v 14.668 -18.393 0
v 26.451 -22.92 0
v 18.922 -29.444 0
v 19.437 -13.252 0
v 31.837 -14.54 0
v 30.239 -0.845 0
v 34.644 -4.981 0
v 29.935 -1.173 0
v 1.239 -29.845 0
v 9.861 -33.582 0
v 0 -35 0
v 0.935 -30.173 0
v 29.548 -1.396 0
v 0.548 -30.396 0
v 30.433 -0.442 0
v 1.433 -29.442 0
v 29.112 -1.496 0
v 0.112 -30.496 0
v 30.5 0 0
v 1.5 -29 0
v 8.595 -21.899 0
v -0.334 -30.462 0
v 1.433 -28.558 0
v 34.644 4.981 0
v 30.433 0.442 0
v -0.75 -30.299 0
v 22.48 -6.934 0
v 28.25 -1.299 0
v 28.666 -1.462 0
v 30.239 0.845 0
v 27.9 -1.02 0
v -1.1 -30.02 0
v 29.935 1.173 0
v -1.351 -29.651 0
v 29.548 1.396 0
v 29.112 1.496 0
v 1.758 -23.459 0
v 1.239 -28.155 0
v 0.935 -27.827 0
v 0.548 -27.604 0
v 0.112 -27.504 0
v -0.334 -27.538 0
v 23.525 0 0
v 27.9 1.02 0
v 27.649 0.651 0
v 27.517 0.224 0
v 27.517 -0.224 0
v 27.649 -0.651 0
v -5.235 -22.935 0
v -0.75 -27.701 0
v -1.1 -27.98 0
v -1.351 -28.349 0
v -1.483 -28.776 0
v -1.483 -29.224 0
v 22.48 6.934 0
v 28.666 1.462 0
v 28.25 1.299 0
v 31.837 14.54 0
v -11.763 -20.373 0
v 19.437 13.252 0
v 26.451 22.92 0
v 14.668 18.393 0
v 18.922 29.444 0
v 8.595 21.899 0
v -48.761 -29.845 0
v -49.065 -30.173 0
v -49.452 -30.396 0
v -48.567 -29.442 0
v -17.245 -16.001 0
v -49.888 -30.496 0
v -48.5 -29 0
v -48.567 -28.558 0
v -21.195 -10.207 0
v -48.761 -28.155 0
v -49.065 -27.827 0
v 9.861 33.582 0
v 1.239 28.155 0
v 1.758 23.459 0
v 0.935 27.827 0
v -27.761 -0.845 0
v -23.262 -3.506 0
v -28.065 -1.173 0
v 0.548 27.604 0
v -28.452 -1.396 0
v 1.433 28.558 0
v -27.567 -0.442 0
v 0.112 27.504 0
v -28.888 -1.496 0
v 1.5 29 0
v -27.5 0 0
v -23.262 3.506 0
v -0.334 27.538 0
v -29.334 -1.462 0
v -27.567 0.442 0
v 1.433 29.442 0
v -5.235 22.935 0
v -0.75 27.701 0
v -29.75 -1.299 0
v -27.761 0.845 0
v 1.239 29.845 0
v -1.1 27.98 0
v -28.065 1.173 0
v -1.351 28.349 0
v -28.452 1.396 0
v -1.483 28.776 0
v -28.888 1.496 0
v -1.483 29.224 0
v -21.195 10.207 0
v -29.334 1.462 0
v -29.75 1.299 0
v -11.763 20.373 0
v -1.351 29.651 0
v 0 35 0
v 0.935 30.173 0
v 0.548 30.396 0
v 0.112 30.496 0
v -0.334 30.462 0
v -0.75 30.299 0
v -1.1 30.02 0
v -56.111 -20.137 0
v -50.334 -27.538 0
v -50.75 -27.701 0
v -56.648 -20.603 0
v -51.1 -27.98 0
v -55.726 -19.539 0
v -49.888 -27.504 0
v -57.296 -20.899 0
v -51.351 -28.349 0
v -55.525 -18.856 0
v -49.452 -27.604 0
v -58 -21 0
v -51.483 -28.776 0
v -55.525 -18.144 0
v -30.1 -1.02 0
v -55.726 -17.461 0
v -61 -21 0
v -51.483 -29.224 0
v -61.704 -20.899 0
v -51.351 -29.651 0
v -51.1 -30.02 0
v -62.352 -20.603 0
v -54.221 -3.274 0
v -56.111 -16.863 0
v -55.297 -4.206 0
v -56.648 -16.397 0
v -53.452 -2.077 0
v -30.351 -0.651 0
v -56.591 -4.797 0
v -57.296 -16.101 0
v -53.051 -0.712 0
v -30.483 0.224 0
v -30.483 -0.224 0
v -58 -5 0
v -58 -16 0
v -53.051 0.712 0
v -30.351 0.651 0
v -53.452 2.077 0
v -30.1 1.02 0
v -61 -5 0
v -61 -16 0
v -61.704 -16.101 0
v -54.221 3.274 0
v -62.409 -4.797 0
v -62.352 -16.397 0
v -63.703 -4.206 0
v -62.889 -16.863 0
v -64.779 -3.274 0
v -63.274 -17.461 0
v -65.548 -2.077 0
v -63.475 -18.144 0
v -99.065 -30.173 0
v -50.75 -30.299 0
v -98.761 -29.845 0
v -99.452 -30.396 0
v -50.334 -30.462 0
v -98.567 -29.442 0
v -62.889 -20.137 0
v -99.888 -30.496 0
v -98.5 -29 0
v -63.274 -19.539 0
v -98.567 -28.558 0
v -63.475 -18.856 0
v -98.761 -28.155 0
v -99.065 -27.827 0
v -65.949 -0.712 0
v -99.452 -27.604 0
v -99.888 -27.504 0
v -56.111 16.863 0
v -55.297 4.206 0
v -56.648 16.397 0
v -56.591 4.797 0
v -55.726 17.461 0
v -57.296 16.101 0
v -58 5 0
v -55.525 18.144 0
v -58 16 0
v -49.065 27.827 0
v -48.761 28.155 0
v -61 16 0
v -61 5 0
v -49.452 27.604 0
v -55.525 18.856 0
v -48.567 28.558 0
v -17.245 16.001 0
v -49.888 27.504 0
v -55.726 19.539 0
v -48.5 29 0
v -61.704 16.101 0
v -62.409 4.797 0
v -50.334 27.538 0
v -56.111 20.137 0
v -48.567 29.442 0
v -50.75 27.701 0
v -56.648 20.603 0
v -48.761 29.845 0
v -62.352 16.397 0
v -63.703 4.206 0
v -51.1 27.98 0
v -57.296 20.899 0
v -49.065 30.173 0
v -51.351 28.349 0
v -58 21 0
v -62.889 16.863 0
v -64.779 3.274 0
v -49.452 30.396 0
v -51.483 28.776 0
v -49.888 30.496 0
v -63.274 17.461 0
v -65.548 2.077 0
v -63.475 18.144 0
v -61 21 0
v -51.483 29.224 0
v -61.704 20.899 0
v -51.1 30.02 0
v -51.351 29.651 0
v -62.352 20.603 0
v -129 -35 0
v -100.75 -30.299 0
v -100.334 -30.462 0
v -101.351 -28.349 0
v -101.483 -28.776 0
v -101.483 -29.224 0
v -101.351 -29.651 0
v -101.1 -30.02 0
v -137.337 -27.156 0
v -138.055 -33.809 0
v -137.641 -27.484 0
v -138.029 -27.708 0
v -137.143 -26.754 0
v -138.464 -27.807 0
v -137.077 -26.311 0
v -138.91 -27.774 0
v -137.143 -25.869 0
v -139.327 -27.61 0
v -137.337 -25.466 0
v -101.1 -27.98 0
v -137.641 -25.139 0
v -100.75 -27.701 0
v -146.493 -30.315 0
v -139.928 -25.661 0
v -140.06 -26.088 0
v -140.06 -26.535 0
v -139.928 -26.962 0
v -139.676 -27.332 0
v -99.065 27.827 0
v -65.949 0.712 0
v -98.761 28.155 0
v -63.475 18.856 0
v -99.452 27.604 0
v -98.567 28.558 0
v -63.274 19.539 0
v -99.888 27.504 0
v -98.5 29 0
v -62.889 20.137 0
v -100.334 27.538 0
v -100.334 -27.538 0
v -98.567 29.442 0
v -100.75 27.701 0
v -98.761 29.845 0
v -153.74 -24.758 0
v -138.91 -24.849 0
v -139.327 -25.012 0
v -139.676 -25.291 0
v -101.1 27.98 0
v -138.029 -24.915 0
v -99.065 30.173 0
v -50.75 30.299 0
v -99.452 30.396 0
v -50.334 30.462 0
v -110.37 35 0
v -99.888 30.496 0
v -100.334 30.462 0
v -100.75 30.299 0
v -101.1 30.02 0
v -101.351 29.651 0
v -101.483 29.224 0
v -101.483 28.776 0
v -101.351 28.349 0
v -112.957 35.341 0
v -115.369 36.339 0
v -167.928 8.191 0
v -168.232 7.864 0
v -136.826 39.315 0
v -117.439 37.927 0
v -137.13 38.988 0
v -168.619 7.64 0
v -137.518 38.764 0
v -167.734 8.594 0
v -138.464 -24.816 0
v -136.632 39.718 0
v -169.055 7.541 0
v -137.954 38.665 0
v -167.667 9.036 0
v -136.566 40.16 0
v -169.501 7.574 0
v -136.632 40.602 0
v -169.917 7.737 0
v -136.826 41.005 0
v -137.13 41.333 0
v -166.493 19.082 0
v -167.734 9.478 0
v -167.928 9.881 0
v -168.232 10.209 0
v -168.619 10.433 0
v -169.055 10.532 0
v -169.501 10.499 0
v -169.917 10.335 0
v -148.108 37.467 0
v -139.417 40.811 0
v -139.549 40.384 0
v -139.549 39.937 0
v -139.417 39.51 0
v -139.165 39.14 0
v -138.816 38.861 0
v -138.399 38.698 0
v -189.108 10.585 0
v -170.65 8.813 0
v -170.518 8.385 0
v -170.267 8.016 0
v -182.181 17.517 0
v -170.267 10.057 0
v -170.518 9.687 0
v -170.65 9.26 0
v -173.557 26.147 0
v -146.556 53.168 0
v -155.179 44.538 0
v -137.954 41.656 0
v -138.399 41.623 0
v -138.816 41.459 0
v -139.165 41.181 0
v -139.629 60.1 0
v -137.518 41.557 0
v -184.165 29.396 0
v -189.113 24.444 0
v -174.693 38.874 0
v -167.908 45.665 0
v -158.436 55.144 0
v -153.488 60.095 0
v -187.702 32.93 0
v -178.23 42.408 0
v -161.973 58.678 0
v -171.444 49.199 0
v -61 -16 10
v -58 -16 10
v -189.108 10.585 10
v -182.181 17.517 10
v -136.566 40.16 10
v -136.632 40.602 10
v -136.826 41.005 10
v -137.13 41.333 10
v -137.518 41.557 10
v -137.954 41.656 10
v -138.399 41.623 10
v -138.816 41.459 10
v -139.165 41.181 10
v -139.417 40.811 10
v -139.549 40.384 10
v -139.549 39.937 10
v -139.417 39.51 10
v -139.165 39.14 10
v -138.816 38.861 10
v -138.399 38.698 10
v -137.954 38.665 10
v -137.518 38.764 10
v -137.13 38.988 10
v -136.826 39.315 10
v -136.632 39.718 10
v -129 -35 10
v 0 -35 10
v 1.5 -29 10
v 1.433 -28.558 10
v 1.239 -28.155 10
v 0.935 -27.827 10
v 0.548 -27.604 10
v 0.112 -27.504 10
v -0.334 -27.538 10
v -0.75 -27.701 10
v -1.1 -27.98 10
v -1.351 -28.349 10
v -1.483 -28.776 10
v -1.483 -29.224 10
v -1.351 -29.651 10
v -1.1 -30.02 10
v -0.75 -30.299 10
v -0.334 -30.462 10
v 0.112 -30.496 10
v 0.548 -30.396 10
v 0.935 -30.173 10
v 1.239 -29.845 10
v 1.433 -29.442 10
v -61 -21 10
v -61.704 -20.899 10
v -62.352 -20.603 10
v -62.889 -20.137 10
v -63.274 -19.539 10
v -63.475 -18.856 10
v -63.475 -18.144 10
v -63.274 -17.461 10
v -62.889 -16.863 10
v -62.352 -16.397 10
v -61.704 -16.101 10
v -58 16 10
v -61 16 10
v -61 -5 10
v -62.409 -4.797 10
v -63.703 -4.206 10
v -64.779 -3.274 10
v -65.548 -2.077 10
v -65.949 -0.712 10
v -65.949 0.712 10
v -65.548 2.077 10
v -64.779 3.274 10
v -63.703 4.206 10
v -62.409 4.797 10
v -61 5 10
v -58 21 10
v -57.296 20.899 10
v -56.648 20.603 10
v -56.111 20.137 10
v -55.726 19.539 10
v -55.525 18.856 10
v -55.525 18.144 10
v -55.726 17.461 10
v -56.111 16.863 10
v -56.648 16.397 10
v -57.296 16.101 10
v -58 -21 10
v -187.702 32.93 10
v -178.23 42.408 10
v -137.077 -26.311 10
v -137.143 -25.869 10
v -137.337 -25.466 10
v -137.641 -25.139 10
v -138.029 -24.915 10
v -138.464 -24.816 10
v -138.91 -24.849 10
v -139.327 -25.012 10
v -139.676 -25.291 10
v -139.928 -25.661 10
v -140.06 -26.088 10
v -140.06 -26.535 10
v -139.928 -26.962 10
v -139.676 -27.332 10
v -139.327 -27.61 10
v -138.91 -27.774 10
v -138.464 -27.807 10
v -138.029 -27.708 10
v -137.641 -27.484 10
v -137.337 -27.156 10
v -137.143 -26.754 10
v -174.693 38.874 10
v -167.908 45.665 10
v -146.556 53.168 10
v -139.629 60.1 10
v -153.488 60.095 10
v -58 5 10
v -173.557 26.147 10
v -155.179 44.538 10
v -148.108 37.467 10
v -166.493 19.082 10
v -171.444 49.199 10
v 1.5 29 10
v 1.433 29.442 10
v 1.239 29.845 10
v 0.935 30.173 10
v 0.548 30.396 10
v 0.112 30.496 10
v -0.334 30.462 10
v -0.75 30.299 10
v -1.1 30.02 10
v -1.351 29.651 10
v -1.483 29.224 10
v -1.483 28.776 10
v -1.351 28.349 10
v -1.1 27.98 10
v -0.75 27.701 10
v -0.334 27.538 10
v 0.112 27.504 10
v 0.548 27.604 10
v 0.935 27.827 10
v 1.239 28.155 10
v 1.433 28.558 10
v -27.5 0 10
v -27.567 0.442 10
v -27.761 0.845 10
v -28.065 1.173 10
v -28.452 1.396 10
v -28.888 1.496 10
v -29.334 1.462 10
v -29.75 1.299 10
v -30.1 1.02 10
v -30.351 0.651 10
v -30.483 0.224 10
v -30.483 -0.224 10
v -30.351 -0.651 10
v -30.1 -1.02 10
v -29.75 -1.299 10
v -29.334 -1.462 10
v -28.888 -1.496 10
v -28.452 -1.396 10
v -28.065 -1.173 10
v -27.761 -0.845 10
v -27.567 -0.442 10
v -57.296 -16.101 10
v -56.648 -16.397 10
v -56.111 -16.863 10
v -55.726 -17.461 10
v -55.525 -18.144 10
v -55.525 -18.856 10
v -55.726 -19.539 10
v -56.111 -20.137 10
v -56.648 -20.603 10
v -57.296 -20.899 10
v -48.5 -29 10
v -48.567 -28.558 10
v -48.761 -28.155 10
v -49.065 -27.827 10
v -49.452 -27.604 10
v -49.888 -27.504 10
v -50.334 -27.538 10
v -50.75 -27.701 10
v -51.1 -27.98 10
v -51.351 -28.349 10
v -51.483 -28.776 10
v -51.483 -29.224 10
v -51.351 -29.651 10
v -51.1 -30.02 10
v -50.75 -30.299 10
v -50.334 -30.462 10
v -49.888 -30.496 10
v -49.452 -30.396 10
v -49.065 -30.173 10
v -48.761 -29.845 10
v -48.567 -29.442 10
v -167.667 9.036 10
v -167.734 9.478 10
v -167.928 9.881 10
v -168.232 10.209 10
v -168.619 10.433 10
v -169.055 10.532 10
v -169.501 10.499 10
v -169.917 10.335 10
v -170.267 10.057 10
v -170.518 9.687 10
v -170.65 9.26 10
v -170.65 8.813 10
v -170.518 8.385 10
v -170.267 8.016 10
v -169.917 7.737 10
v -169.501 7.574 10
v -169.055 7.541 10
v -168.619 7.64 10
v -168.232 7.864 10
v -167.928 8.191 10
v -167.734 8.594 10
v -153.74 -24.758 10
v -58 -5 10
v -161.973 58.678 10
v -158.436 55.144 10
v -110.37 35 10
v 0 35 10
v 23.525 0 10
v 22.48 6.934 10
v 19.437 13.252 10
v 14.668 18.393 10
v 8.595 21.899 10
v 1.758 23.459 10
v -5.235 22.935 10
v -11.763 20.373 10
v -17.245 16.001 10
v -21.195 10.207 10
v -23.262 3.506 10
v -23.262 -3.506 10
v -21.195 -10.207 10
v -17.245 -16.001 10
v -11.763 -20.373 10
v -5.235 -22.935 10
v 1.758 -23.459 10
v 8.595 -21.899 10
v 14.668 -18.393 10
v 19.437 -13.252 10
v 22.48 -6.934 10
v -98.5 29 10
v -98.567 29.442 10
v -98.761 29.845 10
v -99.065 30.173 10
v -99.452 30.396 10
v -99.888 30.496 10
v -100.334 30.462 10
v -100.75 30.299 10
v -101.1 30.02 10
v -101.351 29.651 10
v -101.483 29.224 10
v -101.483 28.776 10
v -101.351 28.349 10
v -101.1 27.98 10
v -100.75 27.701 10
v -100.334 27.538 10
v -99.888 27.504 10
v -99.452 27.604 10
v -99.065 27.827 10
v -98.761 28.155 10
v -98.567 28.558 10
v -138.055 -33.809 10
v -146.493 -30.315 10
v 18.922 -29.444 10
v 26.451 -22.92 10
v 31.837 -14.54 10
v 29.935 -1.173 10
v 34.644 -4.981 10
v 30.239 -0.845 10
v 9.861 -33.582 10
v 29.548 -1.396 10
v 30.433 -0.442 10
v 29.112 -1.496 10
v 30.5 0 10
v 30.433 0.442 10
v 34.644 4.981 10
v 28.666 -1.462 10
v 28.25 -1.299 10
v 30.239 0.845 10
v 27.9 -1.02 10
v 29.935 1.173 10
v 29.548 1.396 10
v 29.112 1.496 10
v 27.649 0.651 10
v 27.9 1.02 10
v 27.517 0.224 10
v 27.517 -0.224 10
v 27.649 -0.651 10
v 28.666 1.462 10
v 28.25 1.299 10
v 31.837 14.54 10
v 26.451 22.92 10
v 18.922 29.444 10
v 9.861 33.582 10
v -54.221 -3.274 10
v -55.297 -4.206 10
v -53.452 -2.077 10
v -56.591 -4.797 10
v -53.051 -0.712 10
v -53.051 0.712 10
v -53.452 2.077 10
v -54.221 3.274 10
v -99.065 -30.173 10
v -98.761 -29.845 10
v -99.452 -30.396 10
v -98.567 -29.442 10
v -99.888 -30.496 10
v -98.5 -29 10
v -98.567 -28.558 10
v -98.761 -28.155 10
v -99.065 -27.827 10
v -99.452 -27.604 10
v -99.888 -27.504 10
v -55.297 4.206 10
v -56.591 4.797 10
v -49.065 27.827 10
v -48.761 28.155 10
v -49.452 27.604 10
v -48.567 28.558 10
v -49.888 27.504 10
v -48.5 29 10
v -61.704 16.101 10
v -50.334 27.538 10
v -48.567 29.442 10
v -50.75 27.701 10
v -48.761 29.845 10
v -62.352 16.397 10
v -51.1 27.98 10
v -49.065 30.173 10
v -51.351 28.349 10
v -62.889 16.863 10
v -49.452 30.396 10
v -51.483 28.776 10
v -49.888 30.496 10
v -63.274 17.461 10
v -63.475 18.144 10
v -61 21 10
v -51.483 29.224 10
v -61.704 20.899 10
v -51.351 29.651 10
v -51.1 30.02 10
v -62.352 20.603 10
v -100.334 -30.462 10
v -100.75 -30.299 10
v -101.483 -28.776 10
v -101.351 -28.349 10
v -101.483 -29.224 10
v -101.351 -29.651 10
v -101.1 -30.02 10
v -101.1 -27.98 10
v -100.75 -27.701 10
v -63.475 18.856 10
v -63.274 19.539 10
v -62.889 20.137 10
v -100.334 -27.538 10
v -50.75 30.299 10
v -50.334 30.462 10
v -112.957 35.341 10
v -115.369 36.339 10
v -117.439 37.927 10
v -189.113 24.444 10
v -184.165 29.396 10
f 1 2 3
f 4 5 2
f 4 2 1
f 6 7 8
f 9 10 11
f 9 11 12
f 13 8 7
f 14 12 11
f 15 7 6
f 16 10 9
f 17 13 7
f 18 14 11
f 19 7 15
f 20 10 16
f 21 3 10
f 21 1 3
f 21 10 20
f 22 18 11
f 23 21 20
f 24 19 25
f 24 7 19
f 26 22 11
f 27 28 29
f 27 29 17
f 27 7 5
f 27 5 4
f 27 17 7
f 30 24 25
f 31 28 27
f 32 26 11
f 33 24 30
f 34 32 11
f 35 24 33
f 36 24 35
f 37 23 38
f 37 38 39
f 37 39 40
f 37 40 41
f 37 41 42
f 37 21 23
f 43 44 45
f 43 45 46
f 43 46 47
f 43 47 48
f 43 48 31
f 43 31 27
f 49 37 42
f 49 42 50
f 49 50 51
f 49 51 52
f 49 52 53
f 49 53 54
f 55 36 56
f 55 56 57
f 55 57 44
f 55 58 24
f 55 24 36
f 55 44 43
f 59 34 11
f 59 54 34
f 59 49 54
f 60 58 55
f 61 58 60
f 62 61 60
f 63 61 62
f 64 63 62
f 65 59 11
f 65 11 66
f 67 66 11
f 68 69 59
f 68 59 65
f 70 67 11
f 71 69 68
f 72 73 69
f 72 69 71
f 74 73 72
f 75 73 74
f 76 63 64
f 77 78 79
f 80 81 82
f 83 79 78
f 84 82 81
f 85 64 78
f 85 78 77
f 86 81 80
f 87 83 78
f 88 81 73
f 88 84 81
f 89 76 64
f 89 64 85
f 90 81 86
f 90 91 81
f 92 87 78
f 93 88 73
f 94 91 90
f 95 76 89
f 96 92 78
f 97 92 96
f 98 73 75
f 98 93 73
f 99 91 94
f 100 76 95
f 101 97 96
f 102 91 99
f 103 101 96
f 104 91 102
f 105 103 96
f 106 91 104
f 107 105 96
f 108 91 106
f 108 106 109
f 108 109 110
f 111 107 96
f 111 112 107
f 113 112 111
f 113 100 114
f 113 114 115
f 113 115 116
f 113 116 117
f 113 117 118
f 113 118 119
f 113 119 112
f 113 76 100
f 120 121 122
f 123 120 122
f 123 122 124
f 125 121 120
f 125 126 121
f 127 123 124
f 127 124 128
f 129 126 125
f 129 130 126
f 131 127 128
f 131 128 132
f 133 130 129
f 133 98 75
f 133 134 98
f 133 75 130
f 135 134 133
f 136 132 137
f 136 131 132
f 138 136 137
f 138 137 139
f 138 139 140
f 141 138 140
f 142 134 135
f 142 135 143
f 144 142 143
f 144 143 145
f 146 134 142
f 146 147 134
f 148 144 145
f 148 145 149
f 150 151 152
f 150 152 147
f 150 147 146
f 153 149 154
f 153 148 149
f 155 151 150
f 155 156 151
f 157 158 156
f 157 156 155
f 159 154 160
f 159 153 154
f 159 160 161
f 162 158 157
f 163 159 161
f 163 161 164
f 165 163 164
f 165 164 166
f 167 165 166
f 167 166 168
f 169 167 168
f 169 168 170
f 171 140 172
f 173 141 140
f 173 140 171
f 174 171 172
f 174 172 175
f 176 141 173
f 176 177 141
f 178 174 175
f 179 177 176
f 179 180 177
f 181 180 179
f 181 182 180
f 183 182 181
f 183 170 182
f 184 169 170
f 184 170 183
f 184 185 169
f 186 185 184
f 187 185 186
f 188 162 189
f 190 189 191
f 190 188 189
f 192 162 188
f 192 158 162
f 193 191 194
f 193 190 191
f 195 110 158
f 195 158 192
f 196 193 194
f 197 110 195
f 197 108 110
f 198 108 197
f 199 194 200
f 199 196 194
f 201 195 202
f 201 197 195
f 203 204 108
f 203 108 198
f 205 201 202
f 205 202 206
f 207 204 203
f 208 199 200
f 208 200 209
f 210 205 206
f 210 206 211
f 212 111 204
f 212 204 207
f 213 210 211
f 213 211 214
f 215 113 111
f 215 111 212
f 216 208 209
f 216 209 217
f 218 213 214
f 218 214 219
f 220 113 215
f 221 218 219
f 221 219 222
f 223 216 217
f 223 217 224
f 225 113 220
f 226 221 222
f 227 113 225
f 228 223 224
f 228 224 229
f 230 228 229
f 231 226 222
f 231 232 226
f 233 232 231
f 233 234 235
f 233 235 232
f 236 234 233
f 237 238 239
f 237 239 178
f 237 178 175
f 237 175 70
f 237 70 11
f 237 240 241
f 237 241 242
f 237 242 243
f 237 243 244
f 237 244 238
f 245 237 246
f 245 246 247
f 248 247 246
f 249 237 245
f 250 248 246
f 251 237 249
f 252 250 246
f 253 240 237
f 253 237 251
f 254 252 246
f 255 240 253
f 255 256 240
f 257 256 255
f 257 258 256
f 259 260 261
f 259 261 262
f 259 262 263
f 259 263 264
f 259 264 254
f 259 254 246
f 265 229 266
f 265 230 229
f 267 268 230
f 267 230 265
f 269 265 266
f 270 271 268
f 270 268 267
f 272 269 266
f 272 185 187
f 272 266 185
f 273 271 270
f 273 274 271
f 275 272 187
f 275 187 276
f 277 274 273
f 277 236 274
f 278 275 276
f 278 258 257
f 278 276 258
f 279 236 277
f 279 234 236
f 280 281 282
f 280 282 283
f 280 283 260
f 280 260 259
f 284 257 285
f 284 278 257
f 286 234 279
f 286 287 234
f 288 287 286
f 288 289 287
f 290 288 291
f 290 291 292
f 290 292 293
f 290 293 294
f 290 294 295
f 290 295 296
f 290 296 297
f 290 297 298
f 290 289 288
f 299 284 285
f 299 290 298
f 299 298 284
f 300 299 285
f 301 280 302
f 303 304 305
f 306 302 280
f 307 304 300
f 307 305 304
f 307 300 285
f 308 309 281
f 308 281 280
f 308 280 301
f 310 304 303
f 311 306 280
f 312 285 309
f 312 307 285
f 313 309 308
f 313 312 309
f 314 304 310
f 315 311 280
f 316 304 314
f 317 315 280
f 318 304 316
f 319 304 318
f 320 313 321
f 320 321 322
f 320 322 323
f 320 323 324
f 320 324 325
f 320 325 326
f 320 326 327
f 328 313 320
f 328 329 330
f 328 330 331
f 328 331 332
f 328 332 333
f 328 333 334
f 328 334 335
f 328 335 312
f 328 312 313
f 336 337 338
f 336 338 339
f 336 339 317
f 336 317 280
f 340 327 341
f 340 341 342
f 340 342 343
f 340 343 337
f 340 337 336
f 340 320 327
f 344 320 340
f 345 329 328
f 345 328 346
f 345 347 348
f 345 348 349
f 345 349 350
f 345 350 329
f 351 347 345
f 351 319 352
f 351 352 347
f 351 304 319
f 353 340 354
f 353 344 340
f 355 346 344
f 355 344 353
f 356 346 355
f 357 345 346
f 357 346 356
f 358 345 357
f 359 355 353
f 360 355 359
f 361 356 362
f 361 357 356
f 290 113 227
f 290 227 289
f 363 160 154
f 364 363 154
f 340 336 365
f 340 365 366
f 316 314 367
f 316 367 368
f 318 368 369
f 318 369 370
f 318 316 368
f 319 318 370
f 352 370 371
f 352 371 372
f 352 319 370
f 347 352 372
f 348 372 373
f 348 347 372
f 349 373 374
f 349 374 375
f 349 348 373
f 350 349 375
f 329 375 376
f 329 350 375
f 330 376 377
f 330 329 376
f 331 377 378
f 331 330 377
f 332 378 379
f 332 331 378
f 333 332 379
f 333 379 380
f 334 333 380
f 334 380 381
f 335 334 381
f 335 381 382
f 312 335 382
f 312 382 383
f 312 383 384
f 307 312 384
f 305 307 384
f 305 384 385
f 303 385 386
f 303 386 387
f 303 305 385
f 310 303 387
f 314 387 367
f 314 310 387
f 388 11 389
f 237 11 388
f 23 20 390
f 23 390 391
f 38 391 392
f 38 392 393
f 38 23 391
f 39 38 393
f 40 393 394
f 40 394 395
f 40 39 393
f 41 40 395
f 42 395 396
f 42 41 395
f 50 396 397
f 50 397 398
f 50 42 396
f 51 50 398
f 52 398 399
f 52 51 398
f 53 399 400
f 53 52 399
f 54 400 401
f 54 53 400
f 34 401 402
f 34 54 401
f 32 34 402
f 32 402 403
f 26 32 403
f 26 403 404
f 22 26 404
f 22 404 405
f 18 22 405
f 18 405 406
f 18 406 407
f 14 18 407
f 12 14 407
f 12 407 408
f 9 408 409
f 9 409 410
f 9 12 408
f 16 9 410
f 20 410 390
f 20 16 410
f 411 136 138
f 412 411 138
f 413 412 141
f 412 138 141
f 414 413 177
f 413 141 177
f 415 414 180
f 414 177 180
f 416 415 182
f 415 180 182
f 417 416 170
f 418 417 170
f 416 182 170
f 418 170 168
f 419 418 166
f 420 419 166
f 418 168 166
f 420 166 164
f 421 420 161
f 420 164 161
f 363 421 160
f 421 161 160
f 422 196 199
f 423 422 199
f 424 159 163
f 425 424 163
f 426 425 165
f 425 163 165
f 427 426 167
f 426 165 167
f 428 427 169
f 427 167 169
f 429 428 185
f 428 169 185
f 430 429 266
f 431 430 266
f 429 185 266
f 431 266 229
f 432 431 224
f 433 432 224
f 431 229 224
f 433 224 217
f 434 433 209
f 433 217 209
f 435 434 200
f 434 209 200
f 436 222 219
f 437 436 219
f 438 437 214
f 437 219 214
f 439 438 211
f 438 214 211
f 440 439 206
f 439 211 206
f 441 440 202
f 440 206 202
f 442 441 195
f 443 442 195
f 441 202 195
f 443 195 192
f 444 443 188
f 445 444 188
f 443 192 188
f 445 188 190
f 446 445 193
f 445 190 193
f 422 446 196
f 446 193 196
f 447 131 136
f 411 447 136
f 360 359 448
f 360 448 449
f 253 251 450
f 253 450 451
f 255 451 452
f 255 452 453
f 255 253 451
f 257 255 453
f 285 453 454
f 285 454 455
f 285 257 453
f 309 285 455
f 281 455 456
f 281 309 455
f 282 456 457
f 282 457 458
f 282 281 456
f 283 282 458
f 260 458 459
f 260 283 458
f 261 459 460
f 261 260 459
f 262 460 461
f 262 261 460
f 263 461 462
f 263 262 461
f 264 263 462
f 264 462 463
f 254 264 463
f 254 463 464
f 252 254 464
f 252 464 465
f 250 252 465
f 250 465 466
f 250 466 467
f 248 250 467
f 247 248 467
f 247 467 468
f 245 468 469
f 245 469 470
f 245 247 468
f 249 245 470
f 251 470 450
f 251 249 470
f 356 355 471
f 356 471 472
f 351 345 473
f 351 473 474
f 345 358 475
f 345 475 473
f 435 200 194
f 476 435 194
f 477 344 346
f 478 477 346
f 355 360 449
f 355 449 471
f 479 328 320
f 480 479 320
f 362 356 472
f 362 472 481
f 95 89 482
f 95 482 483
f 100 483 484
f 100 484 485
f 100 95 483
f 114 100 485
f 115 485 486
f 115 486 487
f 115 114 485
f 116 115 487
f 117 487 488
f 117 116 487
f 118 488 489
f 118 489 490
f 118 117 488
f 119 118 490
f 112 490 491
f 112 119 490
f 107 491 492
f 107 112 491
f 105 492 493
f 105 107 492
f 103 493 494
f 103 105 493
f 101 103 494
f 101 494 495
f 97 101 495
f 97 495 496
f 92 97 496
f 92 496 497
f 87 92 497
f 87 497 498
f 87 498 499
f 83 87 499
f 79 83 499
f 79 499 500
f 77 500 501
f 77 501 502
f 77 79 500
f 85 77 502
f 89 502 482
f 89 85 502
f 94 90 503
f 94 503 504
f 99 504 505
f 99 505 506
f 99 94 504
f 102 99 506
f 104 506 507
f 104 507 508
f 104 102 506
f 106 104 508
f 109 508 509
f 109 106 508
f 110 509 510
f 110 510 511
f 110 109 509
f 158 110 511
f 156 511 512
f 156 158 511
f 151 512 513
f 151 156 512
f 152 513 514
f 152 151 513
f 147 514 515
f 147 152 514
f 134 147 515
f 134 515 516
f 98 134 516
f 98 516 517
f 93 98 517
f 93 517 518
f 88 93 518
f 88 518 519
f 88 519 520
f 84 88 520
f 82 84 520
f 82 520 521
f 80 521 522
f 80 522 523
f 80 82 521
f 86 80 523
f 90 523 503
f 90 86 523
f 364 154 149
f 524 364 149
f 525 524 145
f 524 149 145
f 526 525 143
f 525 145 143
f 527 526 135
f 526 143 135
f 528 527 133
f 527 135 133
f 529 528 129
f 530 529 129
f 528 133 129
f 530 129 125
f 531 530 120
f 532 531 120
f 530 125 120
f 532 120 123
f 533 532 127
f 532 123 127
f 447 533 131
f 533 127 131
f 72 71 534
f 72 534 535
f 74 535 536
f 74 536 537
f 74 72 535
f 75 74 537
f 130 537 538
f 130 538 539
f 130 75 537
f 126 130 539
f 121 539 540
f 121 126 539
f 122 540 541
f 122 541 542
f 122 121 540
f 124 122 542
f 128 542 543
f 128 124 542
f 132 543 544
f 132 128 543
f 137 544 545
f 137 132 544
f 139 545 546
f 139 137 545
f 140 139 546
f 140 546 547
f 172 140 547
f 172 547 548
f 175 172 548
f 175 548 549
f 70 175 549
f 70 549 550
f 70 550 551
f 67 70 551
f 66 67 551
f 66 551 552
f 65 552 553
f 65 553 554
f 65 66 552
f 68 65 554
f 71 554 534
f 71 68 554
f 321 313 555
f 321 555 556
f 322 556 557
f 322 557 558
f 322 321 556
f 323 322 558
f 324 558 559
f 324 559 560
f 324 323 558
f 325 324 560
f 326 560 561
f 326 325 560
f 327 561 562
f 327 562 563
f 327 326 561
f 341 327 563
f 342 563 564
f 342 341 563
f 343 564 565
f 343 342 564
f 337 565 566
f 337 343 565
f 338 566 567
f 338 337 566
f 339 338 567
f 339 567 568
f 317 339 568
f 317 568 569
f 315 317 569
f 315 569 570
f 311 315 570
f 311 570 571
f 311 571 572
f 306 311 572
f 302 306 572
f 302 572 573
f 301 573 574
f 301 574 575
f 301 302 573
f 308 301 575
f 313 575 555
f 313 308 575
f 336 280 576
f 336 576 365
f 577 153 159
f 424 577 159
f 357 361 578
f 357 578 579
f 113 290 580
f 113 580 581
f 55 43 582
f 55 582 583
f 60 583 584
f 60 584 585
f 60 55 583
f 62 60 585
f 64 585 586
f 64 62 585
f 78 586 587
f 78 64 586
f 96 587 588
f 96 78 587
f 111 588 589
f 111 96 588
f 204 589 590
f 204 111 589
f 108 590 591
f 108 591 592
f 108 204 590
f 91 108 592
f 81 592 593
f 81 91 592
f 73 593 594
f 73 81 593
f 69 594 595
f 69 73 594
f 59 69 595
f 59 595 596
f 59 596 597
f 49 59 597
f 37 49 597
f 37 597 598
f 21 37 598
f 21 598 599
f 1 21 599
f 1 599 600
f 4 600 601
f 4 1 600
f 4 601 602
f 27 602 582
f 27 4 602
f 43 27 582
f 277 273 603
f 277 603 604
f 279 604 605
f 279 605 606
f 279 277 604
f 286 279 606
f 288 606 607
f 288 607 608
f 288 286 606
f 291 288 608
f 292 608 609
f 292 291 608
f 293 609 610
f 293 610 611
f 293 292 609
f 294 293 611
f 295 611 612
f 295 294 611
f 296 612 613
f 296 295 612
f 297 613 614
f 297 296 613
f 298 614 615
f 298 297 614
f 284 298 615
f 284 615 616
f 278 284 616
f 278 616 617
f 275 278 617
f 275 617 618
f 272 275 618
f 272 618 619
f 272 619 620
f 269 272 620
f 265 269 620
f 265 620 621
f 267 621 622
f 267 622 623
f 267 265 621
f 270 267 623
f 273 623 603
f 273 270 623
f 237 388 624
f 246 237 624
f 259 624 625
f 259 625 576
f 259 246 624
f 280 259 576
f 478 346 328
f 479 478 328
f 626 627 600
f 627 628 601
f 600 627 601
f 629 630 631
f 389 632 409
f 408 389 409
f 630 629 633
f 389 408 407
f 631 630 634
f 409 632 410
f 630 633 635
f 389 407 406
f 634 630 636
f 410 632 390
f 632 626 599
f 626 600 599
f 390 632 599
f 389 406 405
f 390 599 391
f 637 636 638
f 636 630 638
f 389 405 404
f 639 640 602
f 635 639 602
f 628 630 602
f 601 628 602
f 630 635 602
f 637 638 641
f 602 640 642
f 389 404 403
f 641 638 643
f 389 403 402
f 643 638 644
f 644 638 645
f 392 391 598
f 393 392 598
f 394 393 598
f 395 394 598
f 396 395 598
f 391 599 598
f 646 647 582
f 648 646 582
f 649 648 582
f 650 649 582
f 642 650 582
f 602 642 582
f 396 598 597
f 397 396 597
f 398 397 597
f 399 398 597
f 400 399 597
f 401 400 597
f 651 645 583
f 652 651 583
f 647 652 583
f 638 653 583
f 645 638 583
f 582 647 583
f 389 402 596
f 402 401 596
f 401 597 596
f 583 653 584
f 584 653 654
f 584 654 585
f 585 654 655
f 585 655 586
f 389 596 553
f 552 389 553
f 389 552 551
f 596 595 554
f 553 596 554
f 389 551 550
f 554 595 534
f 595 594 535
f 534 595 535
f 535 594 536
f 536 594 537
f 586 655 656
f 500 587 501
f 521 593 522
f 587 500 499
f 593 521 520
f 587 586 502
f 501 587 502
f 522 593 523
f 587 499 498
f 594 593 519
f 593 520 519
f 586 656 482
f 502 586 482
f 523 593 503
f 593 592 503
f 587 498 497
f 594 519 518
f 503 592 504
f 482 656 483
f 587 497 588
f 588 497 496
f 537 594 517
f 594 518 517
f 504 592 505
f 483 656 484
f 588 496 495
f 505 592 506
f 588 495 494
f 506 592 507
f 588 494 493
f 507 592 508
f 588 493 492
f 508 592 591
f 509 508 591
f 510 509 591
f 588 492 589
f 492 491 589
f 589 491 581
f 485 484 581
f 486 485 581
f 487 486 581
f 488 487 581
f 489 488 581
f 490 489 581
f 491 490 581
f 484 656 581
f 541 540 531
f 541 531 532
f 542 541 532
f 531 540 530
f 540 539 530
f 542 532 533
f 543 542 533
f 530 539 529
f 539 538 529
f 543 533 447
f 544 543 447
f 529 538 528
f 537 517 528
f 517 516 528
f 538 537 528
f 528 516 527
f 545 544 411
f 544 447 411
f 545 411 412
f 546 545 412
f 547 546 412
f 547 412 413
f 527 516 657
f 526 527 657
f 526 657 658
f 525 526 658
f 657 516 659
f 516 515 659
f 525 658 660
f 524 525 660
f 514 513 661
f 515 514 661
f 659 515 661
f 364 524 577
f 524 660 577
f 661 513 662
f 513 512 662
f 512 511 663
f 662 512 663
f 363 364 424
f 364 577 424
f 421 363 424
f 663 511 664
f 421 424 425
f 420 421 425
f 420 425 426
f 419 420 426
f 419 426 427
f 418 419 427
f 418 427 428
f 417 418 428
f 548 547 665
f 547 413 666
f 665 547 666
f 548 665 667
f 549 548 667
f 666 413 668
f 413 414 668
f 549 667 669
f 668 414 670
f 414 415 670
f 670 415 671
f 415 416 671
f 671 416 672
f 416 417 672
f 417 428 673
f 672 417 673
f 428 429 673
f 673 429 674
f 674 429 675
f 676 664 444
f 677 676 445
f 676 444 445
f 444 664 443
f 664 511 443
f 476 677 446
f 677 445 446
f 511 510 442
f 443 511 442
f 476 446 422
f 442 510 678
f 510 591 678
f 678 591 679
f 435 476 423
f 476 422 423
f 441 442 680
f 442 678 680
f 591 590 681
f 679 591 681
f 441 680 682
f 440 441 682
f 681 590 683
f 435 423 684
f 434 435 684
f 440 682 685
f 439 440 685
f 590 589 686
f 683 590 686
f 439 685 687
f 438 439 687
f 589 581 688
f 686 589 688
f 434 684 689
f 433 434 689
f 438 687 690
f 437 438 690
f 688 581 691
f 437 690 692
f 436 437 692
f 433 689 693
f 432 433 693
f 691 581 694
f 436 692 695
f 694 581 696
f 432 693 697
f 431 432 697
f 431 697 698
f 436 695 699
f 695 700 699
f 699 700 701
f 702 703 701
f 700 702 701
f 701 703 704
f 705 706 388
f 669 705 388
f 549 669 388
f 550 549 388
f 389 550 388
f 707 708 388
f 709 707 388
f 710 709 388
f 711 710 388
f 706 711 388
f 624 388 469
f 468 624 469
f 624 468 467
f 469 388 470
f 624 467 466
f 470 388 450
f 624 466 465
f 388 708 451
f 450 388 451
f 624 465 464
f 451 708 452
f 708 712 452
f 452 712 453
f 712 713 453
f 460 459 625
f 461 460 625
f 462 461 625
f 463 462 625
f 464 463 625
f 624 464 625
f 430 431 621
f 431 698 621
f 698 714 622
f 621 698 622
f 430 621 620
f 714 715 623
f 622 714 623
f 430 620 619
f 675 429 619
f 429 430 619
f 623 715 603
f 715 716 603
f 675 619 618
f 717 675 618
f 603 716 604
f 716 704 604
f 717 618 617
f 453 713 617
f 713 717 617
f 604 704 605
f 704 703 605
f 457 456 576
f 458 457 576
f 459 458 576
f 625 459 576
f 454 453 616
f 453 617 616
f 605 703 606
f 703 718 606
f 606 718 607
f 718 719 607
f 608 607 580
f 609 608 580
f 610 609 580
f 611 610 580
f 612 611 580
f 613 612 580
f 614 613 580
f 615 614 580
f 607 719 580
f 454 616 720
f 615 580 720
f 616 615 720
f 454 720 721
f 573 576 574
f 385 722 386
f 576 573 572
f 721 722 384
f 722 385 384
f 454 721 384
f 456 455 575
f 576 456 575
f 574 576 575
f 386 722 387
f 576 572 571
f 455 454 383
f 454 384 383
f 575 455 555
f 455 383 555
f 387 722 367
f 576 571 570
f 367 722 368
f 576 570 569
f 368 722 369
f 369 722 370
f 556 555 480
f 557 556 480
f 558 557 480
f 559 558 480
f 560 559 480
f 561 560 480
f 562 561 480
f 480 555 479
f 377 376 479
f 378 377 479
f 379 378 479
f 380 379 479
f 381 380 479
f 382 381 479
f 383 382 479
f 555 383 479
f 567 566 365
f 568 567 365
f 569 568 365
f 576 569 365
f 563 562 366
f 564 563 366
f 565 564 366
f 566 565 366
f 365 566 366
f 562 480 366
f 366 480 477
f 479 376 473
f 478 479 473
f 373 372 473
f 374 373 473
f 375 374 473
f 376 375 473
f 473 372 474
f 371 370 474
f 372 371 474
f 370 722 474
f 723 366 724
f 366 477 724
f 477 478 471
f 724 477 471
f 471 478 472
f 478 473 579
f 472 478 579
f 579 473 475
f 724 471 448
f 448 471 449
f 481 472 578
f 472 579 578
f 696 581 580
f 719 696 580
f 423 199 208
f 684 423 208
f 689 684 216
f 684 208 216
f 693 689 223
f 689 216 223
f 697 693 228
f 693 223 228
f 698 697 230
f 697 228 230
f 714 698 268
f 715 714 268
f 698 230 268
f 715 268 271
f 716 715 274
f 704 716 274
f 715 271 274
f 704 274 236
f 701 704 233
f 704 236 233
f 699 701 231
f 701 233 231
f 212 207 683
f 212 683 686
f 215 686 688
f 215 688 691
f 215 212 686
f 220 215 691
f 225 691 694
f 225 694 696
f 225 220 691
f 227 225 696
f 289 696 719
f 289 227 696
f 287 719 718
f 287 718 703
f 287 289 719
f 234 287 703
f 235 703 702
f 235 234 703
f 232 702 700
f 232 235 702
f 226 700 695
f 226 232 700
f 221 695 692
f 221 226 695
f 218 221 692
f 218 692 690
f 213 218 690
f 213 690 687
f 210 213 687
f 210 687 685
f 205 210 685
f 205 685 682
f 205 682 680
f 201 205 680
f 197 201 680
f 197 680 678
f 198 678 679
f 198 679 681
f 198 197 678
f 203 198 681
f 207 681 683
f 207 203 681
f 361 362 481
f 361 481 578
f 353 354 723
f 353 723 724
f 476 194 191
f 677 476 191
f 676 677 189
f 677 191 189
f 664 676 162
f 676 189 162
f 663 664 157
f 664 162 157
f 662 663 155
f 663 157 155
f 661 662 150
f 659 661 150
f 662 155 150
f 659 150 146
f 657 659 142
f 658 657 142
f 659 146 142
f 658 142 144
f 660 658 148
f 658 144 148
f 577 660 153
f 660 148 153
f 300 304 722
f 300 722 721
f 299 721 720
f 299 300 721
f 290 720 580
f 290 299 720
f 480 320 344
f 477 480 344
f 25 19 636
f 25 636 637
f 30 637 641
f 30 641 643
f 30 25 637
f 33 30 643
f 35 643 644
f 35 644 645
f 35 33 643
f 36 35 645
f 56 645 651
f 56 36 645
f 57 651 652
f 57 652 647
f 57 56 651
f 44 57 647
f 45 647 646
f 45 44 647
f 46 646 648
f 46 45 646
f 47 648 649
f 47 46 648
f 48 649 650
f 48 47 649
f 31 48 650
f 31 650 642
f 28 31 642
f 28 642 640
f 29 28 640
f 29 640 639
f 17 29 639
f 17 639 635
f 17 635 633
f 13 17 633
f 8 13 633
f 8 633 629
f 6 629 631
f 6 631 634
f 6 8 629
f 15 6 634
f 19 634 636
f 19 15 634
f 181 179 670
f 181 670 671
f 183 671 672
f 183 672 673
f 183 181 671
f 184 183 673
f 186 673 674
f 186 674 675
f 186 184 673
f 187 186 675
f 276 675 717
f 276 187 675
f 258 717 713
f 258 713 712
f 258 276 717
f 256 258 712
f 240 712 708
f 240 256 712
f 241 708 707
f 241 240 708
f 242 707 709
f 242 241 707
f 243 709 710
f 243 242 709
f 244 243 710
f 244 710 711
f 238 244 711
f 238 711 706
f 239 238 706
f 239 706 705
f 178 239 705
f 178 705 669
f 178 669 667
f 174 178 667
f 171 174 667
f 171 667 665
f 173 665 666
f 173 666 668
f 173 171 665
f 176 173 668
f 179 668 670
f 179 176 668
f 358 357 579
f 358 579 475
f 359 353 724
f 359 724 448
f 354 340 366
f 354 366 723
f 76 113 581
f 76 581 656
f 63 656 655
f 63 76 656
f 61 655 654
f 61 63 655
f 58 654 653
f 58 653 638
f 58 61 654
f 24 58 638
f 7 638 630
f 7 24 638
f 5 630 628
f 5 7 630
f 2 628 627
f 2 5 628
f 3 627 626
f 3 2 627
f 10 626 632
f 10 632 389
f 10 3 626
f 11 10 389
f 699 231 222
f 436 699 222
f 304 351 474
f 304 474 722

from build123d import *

# Parameters (mm, degrees)
SKETCH1_R           = 23.525
SKETCH1_R_2         = 1.5
BOSS_EXTRUDE1_DEPTH = 10


with BuildPart() as part:
    # Sketch1 → Boss-Extrude1 (new body)
    with BuildSketch(Plane.XY):
        with BuildLine():
            Line((0, -35), (-129, -35))
            ThreePointArc((-129, -35), (-142.388025128, -32.338224799), (-153.739712354, -24.757759039))
            Line((-153.739712354, -24.757759039), (-189.107939553, 10.584687182))
            Line((-189.107939553, 10.584687182), (-182.180820093, 17.516859712))
            Line((-182.180820093, 17.516859712), (-189.112992624, 24.443979172))
            Line((-189.112992624, 24.443979172), (-184.165050154, 29.395530979))
            Line((-184.165050154, 29.395530979), (-187.701872873, 32.929775601))
            Line((-187.701872873, 32.929775601), (-178.230097286, 42.408460491))
            Line((-178.230097286, 42.408460491), (-174.693274566, 38.874215869))
            Line((-174.693274566, 38.874215869), (-167.907524892, 45.664915491))
            Line((-167.907524892, 45.664915491), (-171.444347612, 49.199160113))
            Line((-171.444347612, 49.199160113), (-161.972572025, 58.677845002))
            Line((-161.972572025, 58.677845002), (-158.435749305, 55.14360038))
            Line((-158.435749305, 55.14360038), (-153.487806834, 60.095152188))
            Line((-153.487806834, 60.095152188), (-146.555634303, 53.168032728))
            Line((-146.555634303, 53.168032728), (-139.628514844, 60.100205259))
            Line((-139.628514844, 60.100205259), (-117.439262294, 37.927127131))
            ThreePointArc((-117.439262294, 37.927127131), (-114.195654931, 35.760716243), (-110.37, 35))
            Line((-110.37, 35), (0, 35))
            ThreePointArc((0, 35), (35, 0), (0, -35))
        make_face()
        Circle(SKETCH1_R, mode=Mode.SUBTRACT)
        with Locations((29, 0)):
            Circle(SKETCH1_R_2, mode=Mode.SUBTRACT)
        with Locations((0, 29)):
            Circle(SKETCH1_R_2, mode=Mode.SUBTRACT)
        with Locations((0, -29)):
            Circle(SKETCH1_R_2, mode=Mode.SUBTRACT)
        with Locations((-50, -29)):
            Circle(SKETCH1_R_2, mode=Mode.SUBTRACT)
        with Locations((-50, 29)):
            Circle(SKETCH1_R_2, mode=Mode.SUBTRACT)
        with Locations((-100, -29)):
            Circle(SKETCH1_R_2, mode=Mode.SUBTRACT)
        with Locations((-100, 29)):
            Circle(SKETCH1_R_2, mode=Mode.SUBTRACT)
        with Locations((-29, 0)):
            Circle(SKETCH1_R_2, mode=Mode.SUBTRACT)
        with Locations((-169.166963878, 9.036324012)):
            Circle(SKETCH1_R_2, mode=Mode.SUBTRACT)
        with Locations((-138.065609793, 40.160362537)):
            Circle(SKETCH1_R_2, mode=Mode.SUBTRACT)
        with Locations((-138.576564013, -26.311393382)):
            Circle(SKETCH1_R_2, mode=Mode.SUBTRACT)
        with BuildLine():
            Line((-58, -5), (-61, -5))
            ThreePointArc((-61, -5), (-66, 0), (-61, 5))
            Line((-61, 5), (-58, 5))
            ThreePointArc((-58, 5), (-53, 0), (-58, -5))
        make_face(mode=Mode.SUBTRACT)
        with BuildLine():
            Line((-58, 16), (-61, 16))
            ThreePointArc((-61, 16), (-63.5, 18.5), (-61, 21))
            Line((-61, 21), (-58, 21))
            ThreePointArc((-58, 21), (-55.5, 18.5), (-58, 16))
        make_face(mode=Mode.SUBTRACT)
        with BuildLine():
            Line((-58, -21), (-61, -21))
            ThreePointArc((-61, -21), (-63.5, -18.5), (-61, -16))
            Line((-61, -16), (-58, -16))
            ThreePointArc((-58, -16), (-55.5, -18.5), (-58, -21))
        make_face(mode=Mode.SUBTRACT)
        Polygon((-173.557263216, 26.146707149), (-155.179191181, 44.538185292), (-148.108123369, 37.46711748), (-166.492898458, 19.082342391), align=None, mode=Mode.SUBTRACT)
    extrude(amount=BOSS_EXTRUDE1_DEPTH)


solid = part.part
